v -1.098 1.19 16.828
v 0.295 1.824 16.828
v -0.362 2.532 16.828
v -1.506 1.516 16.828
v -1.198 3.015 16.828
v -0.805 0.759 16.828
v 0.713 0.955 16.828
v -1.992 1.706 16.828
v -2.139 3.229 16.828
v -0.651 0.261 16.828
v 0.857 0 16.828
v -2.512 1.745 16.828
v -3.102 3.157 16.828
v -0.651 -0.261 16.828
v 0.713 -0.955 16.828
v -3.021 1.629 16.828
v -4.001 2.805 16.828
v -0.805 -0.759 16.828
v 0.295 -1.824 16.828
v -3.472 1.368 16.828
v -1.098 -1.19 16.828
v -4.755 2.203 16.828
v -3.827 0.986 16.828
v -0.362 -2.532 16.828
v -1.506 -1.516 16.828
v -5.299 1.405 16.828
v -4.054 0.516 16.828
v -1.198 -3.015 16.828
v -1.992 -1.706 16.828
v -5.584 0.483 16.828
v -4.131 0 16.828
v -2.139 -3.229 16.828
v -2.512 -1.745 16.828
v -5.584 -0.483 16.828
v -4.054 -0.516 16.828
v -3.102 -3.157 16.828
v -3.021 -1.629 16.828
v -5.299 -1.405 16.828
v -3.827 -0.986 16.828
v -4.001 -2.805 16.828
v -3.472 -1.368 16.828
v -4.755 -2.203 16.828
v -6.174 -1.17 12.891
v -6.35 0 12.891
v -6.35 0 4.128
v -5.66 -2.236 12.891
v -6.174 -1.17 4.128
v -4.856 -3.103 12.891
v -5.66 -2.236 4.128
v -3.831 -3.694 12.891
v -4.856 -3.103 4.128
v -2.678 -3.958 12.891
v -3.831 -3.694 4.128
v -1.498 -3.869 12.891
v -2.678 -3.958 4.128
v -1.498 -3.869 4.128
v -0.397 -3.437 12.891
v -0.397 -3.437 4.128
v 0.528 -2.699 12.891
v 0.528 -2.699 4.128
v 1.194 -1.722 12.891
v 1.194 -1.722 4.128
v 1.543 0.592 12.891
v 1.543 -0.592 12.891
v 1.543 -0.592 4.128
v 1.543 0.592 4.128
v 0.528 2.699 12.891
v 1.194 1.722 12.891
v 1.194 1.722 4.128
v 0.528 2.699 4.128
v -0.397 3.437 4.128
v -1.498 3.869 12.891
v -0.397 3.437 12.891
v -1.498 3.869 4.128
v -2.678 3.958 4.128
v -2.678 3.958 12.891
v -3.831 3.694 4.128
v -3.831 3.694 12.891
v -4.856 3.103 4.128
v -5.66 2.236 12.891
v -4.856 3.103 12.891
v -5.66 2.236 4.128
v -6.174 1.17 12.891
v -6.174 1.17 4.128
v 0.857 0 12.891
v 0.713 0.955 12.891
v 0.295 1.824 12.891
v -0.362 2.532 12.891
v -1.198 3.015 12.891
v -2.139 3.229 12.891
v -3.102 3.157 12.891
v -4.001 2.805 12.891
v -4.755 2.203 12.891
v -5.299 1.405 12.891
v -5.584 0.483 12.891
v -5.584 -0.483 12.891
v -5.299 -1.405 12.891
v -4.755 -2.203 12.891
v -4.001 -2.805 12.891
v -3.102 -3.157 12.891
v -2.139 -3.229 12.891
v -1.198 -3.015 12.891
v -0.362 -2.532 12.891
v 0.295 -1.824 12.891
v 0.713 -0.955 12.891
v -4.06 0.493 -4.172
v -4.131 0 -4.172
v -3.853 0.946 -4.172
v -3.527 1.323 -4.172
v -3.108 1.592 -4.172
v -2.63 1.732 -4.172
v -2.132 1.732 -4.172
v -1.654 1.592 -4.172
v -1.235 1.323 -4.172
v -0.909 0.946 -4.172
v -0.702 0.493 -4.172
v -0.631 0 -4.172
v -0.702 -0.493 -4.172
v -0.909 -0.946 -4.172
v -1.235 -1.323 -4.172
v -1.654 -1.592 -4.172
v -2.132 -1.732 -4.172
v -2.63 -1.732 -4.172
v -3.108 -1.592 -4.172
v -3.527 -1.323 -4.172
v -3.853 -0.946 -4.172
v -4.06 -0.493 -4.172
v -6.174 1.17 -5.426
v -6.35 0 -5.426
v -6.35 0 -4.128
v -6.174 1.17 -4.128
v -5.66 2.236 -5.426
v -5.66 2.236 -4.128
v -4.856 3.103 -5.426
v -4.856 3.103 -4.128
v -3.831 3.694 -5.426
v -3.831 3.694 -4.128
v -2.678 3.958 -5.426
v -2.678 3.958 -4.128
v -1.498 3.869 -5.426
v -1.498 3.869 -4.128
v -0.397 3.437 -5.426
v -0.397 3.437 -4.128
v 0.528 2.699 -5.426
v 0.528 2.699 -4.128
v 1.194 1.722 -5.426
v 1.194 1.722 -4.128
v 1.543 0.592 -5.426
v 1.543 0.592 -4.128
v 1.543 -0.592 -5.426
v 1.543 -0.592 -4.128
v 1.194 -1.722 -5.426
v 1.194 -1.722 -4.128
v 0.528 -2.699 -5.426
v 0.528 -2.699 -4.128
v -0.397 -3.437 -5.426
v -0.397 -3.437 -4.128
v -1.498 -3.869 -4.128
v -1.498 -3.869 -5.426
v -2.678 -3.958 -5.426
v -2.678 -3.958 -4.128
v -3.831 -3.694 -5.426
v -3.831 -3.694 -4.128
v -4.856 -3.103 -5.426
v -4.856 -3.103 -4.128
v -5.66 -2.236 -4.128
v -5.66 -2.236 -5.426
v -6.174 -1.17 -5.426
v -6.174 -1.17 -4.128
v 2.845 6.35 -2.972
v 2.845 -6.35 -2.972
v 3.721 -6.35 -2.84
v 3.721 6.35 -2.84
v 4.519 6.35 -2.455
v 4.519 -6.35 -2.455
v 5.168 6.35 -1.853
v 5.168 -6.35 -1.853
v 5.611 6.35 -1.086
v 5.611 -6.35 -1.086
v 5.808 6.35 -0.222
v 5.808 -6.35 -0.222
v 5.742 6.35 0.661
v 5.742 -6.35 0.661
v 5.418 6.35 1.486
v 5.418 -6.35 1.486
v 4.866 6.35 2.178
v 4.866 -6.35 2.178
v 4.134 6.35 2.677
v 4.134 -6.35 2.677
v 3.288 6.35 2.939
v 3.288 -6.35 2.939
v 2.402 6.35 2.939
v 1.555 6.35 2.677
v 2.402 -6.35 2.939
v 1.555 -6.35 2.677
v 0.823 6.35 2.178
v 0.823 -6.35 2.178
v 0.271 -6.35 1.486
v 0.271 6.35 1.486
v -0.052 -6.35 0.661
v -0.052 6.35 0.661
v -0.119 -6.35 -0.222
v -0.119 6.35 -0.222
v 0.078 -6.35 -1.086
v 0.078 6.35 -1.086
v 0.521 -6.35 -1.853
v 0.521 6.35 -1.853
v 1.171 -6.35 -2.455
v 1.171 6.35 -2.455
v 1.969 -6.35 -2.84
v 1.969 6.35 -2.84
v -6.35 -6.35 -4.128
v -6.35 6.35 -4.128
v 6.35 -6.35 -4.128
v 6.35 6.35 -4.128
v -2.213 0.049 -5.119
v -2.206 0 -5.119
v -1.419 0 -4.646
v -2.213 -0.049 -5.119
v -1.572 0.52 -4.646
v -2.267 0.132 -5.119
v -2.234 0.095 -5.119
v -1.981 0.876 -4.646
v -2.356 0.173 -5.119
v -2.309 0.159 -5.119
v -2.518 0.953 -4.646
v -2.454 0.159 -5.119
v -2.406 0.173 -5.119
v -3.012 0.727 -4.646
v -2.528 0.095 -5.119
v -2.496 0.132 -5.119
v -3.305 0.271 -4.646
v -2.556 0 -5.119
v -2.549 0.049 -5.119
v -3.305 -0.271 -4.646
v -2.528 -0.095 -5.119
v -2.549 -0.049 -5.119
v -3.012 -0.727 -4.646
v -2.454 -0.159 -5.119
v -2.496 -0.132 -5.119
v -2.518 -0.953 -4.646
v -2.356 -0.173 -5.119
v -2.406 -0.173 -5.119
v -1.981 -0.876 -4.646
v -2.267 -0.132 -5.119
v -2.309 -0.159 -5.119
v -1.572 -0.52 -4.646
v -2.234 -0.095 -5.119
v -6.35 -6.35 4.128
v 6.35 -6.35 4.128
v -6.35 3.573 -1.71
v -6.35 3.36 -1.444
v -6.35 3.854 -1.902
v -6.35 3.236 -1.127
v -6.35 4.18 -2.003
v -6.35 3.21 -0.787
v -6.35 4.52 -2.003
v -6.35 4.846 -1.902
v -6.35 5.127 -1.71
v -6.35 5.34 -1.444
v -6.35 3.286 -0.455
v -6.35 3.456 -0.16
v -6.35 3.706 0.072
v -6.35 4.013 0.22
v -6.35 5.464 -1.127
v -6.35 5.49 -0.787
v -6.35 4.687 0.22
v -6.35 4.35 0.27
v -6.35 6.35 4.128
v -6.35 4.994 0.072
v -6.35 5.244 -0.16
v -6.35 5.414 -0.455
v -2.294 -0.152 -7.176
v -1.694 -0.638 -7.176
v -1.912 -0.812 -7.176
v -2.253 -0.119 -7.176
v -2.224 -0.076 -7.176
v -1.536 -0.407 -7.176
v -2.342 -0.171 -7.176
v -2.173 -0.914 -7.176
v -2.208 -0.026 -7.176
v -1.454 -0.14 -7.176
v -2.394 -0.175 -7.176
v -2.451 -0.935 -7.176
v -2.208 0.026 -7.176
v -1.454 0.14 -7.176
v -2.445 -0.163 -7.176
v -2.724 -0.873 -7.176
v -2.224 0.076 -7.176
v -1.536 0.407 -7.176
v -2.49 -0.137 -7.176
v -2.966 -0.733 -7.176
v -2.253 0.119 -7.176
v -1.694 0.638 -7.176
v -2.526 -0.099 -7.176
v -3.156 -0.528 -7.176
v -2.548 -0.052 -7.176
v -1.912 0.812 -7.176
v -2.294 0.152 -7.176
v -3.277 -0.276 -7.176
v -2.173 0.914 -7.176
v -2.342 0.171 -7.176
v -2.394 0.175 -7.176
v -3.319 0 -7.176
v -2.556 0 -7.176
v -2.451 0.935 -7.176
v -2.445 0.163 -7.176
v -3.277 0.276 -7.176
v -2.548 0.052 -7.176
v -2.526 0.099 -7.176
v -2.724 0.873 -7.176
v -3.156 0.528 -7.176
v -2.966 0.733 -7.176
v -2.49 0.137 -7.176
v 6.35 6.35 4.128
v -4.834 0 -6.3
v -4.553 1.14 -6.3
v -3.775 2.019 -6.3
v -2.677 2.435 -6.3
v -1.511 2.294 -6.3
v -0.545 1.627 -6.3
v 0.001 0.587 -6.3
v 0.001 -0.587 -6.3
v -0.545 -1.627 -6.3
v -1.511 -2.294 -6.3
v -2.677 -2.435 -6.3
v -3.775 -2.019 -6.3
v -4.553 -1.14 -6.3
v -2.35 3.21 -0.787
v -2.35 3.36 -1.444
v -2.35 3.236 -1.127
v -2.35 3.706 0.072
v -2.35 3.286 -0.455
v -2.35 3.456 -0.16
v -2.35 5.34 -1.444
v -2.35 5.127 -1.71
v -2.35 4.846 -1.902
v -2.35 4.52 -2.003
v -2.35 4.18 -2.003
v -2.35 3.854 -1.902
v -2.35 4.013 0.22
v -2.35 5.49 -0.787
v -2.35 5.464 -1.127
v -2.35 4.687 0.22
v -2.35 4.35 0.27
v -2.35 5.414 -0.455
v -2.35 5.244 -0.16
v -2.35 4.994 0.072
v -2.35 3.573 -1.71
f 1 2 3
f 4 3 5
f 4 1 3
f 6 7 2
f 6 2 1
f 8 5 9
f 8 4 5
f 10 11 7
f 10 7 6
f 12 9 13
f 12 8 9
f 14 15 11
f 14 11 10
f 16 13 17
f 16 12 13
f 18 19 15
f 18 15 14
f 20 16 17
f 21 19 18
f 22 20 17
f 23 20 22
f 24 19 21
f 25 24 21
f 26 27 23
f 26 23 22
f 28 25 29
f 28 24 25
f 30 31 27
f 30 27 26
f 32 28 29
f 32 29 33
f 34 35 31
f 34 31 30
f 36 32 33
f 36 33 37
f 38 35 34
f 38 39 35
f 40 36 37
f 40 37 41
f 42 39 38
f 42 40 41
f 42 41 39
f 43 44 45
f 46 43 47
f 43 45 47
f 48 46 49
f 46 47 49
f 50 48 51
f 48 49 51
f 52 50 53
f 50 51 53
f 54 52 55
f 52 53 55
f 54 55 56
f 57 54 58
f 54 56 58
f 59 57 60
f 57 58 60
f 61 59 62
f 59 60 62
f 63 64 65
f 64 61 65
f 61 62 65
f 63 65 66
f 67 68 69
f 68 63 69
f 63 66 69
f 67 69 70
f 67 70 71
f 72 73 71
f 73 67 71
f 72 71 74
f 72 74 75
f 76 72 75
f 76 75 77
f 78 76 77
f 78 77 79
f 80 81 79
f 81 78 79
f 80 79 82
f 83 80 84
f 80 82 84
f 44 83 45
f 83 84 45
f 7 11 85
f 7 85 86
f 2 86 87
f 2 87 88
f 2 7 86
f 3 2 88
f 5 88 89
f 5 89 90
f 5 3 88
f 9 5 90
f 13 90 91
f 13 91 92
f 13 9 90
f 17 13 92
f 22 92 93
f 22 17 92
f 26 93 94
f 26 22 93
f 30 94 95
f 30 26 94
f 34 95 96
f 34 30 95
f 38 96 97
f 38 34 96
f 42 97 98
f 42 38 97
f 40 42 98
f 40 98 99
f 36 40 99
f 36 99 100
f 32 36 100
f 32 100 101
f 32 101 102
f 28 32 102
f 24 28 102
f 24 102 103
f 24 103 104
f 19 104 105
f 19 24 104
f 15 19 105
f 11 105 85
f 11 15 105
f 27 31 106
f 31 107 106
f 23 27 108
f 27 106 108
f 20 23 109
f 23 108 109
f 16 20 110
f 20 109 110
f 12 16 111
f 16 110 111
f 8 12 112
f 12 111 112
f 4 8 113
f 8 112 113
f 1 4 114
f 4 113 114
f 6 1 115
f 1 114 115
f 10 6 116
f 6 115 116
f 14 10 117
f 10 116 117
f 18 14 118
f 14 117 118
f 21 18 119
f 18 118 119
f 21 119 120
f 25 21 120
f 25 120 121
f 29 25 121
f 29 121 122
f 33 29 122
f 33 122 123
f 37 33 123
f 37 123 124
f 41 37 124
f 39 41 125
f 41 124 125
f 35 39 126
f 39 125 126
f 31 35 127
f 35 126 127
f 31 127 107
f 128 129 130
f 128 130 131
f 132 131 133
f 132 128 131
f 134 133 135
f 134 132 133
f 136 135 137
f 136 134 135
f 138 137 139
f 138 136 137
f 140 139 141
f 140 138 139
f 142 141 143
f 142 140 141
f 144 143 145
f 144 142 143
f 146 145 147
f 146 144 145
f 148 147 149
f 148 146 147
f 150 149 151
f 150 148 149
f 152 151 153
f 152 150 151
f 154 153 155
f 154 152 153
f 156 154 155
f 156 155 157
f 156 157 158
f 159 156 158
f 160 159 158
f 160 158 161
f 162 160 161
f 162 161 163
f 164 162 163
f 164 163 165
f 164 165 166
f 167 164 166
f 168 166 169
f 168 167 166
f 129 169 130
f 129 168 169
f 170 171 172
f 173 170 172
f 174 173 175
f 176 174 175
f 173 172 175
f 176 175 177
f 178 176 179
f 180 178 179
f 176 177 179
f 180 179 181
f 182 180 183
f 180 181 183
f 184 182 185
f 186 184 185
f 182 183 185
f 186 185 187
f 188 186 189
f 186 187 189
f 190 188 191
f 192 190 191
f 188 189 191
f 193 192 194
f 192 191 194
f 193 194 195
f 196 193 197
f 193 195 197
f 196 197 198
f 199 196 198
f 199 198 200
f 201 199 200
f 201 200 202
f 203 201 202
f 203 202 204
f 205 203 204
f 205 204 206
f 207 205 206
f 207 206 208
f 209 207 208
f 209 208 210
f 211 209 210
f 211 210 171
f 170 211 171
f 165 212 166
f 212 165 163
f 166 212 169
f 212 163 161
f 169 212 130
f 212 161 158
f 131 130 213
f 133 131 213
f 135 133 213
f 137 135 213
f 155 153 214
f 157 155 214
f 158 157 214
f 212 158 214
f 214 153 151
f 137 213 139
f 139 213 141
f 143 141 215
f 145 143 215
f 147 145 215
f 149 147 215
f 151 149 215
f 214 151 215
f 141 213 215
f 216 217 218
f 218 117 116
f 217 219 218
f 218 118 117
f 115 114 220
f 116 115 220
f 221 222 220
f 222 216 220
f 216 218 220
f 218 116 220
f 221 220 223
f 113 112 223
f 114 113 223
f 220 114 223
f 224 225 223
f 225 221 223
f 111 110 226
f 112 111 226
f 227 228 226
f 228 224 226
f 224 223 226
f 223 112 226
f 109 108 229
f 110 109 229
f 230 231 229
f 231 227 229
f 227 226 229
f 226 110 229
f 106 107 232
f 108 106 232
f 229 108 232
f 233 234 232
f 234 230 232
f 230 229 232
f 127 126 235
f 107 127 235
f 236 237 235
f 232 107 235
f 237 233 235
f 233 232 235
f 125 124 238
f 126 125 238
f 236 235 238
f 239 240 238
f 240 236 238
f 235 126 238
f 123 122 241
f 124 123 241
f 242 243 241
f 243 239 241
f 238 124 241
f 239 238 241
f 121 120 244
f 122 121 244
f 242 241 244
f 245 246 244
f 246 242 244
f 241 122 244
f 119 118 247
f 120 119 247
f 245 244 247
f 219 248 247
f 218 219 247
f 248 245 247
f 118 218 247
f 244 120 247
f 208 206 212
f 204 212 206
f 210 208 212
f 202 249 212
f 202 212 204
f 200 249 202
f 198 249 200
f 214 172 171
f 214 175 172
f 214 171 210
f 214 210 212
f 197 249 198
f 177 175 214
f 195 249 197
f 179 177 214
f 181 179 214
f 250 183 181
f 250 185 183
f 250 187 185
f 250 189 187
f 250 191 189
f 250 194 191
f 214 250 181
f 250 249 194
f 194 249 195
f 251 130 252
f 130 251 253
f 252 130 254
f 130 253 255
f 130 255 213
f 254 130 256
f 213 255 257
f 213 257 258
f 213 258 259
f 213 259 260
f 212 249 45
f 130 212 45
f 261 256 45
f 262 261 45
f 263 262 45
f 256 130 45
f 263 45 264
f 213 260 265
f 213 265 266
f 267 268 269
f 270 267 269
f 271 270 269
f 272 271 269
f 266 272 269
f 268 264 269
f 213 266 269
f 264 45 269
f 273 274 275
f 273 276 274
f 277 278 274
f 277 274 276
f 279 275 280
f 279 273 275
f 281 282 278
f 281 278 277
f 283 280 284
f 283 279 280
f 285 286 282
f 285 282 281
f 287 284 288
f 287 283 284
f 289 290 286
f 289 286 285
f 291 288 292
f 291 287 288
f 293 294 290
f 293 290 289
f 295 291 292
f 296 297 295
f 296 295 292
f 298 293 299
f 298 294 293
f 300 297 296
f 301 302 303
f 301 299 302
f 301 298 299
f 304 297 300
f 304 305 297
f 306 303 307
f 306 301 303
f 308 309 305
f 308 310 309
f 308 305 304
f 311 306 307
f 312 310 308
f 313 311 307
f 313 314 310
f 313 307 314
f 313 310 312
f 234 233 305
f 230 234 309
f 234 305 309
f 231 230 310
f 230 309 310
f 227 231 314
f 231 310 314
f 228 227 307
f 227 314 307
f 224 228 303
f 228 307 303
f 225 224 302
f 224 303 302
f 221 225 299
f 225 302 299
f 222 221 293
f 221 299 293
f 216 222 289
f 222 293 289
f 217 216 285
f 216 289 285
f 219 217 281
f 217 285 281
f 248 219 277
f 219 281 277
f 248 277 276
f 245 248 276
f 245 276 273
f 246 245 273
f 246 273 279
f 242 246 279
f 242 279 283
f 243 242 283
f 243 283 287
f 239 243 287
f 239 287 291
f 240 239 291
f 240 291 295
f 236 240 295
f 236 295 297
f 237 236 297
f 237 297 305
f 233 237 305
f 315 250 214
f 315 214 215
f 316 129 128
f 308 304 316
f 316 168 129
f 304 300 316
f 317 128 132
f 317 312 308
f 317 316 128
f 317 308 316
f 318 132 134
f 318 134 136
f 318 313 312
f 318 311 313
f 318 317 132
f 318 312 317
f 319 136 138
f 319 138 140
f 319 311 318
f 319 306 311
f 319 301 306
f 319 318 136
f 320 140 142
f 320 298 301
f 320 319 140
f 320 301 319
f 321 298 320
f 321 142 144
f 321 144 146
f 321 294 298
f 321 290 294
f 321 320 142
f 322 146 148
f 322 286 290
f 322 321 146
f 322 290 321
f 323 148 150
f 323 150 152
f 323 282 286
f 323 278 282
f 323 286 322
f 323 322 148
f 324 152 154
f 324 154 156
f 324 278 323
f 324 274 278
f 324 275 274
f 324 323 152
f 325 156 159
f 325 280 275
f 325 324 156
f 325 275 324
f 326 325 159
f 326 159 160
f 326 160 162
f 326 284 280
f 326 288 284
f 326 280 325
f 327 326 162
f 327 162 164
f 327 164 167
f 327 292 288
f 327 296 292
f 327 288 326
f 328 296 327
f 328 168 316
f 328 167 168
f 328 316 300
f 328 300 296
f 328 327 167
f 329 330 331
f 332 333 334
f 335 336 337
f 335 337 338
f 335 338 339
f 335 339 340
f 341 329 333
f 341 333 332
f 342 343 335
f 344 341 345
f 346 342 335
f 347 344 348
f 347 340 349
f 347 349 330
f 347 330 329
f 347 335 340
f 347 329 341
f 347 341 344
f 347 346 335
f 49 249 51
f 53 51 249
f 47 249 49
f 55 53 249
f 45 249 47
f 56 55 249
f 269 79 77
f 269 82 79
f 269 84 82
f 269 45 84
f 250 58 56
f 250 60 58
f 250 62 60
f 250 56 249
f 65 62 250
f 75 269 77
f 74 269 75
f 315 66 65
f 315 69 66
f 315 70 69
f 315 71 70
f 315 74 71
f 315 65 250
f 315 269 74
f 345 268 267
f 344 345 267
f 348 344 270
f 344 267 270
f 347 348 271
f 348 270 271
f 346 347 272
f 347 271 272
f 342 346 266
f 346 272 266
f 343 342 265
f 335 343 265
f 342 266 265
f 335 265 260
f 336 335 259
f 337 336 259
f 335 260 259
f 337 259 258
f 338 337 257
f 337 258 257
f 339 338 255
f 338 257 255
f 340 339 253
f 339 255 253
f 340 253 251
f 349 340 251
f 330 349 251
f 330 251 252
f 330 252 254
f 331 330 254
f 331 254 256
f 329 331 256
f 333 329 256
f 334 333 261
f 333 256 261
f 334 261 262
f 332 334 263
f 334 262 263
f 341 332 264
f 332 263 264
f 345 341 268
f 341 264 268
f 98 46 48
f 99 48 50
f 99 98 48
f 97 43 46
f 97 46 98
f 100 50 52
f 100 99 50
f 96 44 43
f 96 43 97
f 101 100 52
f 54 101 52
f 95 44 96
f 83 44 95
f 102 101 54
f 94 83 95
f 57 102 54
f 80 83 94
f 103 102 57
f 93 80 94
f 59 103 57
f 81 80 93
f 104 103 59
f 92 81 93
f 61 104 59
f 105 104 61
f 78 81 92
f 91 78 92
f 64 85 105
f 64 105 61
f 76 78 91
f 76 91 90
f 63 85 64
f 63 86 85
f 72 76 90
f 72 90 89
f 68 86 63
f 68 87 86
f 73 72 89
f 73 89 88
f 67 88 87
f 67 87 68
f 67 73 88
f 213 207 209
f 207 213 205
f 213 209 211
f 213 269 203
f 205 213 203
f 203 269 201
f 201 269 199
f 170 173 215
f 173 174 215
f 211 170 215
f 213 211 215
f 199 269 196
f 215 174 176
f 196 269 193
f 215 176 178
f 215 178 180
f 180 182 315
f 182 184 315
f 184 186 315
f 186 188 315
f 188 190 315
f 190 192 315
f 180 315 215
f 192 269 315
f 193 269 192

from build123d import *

# Parameters (mm, degrees)
SKETCH1_W                      = 12.7
SKETCH1_H                      = 12.7
BOSS_EXTRUDE1_DEPTH            = 4.1275
SKETCH2_R                      = 2.9718
CUT_EXTRUDE1_DEPTH             = 15.786776398
SKETCH3_R                      = 3.96875
BOSS_EXTRUDE2_DEPTH            = 12.7
SKETCH4_OUTSIDE_W              = 20.22
SKETCH4_OUTSIDE_H              = 20.22
SKETCH4_OUTSIDE_R              = 3.2385
CUT_EXTRUDE2_DEPTH             = 3.937
BOSS_EXTRUDE3_START            = 3.048
SKETCH5_R                      = 3.96875
BOSS_EXTRUDE3_DEPTH            = 3.048
CHAMFER1_SIZE                  = 1.75
CHAMFER1_SIZE2                 = 3.031088913
SKETCH6_R                      = 0.175
CUT_EXTRUDE3_DEPTH             = 26.627895134
F_3_5_3_5_DIAMETER_HOLE1_D     = 3.5
F_3_5_3_5_DIAMETER_HOLE1_DEPTH = 21
F_3_5_3_5_DIAMETER_HOLE1_TIP   = 1.051506083
SKETCH11_R                     = 1.143
CUT_EXTRUDE4_DEPTH             = 4


with BuildPart() as part:
    # Sketch1 → Boss-Extrude1 (new, symmetric)
    with BuildSketch(Plane.XY):
        Rectangle(SKETCH1_W, SKETCH1_H)
    extrude(amount=BOSS_EXTRUDE1_DEPTH, both=True)

    # Sketch2 → Cut-Extrude1 (cut, through all)
    with BuildSketch(Plane.XZ.offset(6.35)):
        with Locations(Location((2.8448, 0, 0), (0, 0, 270))):
            Circle(SKETCH2_R)
    extrude(amount=-CUT_EXTRUDE1_DEPTH, mode=Mode.SUBTRACT)

    # Sketch3 → Boss-Extrude2 (add)
    with BuildSketch(Plane.XY.offset(4.1275)):
        with Locations(Location((-2.38125, 0, 0), (0, 0, 180))):
            Circle(SKETCH3_R)
    extrude(amount=BOSS_EXTRUDE2_DEPTH)

    # Sketch4 outside → Cut-Extrude2 (cut)
    with BuildSketch(Plane.XY.offset(16.8275)):
        Rectangle(SKETCH4_OUTSIDE_W, SKETCH4_OUTSIDE_H)
        with Locations((-2.38125, 0)):
            Circle(SKETCH4_OUTSIDE_R, mode=Mode.SUBTRACT)
    extrude(amount=-CUT_EXTRUDE2_DEPTH, mode=Mode.SUBTRACT)

    # Sketch5 → Boss-Extrude3 (add)
    with BuildSketch(Plane(origin=(0, 0, -4.1275), x_dir=(-1, 0, 0), z_dir=(0, 0, -1)).offset(BOSS_EXTRUDE3_START)):
        with Locations((2.38125, 0)):
            Circle(SKETCH5_R)
    extrude(amount=-BOSS_EXTRUDE3_DEPTH)

    # Chamfer1
    chamfer1_edges = [part.edges().sort_by_distance(p)[0] for p in [
        (1.5875, 0, -7.1755),
    ]]
    chamfer1_side = [part.faces().sort_by_distance(p)[0] for p in [
        (1.5875, 0, -5.6515),
    ]]
    chamfer(chamfer1_edges, length=CHAMFER1_SIZE, length2=CHAMFER1_SIZE2, reference=chamfer1_side[0])

    # Sketch6 → Cut-Extrude3 (cut, through all)
    with BuildSketch(Plane(origin=(0, 0, -7.1755), x_dir=(-1, 0, 0), z_dir=(0, 0, -1))):
        with Locations((2.38125, 0)):
            Circle(SKETCH6_R)
    extrude(amount=-CUT_EXTRUDE3_DEPTH, mode=Mode.SUBTRACT)

    # Ø3.5 (3.5) Diameter Hole1
    with Locations(Plane.XY.offset(16.8275)):
        with Locations((-2.38125, 0)):
            Hole(F_3_5_3_5_DIAMETER_HOLE1_D / 2, depth=F_3_5_3_5_DIAMETER_HOLE1_DEPTH)
            with Locations((0, 0, -(F_3_5_3_5_DIAMETER_HOLE1_DEPTH + F_3_5_3_5_DIAMETER_HOLE1_TIP / 2))):  # 118° drill point
                Cone(0, F_3_5_3_5_DIAMETER_HOLE1_D / 2, F_3_5_3_5_DIAMETER_HOLE1_TIP, mode=Mode.SUBTRACT)

    # Sketch11 → Cut-Extrude4 (cut)
    with BuildSketch(Plane.ZY.offset(6.35)):
        with Locations((-0.8725, 4.35)):
            Circle(SKETCH11_R)
    extrude(amount=-CUT_EXTRUDE4_DEPTH, mode=Mode.SUBTRACT)


solid = part.part
